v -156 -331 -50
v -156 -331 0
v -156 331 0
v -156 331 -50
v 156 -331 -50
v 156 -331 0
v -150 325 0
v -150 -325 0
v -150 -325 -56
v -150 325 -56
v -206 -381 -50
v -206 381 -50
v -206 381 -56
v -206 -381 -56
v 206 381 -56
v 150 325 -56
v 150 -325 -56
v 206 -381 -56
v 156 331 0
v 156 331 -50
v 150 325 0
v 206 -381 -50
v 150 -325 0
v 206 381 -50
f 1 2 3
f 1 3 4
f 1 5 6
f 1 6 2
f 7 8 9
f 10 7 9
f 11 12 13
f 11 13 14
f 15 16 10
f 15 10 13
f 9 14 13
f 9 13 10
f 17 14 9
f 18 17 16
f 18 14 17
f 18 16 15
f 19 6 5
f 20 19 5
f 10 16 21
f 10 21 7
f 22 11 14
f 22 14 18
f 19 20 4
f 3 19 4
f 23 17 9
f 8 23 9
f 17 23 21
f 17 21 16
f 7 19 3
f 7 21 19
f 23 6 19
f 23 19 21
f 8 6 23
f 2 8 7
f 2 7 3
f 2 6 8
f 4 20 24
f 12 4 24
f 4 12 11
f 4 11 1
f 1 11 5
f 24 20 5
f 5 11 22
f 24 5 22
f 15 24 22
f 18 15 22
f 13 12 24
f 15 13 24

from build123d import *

# Parameters (mm, degrees)
SKETCH054_W            = 300
SKETCH054_H            = 60
PAD003_DEPTH           = 325
SKETCH004_W            = 312
SKETCH004_H            = 50
PAD004_DEPTH           = 331
SKETCH055_W            = 412
SKETCH055_H            = 762
PAD005_DEPTH           = 6
CUT001_PLACEMENT_ANGLE = 180


with BuildPart() as body002:
    # Sketch054 → Pad003 (new body, symmetric)
    with BuildSketch(Plane.XZ):
        with Locations((0, 30)):
            Rectangle(SKETCH054_W, SKETCH054_H)
    extrude(amount=PAD003_DEPTH, both=True)


with BuildPart() as cut001:
    # Sketch004 → Pad004 (new body, symmetric)
    with BuildSketch(Plane.XZ):
        with Locations((0, 25)):
            Rectangle(SKETCH004_W, SKETCH004_H)
    extrude(amount=PAD004_DEPTH, both=True)

    # Sketch055 (on Face3 of Pad004) → Pad005 (join)
    with BuildSketch(Plane(origin=(0, 0, 50), x_dir=(-1, 0, 0), z_dir=(0, 0, 1))):
        Rectangle(SKETCH055_W, SKETCH055_H)
    extrude(amount=PAD005_DEPTH)

    # Cut001: cut Body002
    add(body002.part, mode=Mode.SUBTRACT)


with BuildPart() as cut001_1:
    # Cut001 placement: moved
    add(cut001.part.rotate(Axis((0, 0, 0), (0, 1, 0)), CUT001_PLACEMENT_ANGLE))


solid = cut001_1.part
